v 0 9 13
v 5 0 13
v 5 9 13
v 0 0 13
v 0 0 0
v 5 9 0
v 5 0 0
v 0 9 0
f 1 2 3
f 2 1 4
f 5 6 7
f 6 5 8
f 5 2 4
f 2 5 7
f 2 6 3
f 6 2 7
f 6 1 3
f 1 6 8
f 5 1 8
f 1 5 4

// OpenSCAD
// Generated by SolidPython 1.0.1 on 2020-07-29 00:46:54


cube(size = [5, 9, 13]);
/***********************************************
*********      SolidPython code:      **********
************************************************
 
# import packages: SolidPython
from solid import *
from solid.utils import *
from itertools import chain, combinations, permutations


class Resize:

    def __init__(self, scad_file):
        self.scad_file = scad_file
        #self.scad_file = import_scad(scad_file)
        # cone/cylinder param:
        self.r1 = 0
        self.r2 = 0
        self.h = 0
        # rectangular prism param:
        self.w = 0
        self.l = 0
        # ellipse param:
        self.r = 0

    # import OpenScad code (file name corresponds to shape)


    # classify shape + parameters
    def assign(self, param1, param2, param3):
        if self.scad_file == 'cone.scad':
            self.r1 = param1
            self.r2 = param2
            self.h = param3
        elif self.scad_file == 'cylinder.scad':
            self.r1 = param1
            self.r2 = param2
            self.h = param3
        elif self.scad_file == 'rectangularPrism.scad':
            self.h = param1
            self.l = param2
            self.w = param3
        else:
            self.r = param1
            self.h = param2

    # resize parameters
    def iterate(self):
        x = range(3, 20, 2)
        i = 1
        if self.scad_file == 'cone.scad':
            tempList = list(permutations(x, 2))
            for temp in tempList:
                param1 = temp[0]
                param2 = temp[1]
                filepath = 'produced_scad_files/' + 'cone' + str(param1) + '_' + str(param2) + '_' + '.scad'
                scad_render_to_file(cylinder(h=param1, r1=param2, r2=0), filepath)

        elif self.scad_file == 'cylinder.scad':
            tempList = list(permutations(x, 3))
            for temp in tempList:
                param1 = temp[0]
                param2 = temp[1]
                filepath = 'produced_scad_files/' + 'cylinder' + str(param1) + '_' + str(param2) + '_' + '.scad'
                scad_render_to_file(cylinder(h=param1, r1=param2, r2=param2), filepath)

        elif self.scad_file == 'rectangularPrism.scad':
            tempList = list(permutations(x, 3))
            for temp in tempList:
                param1 = temp[0]
                param2 = temp[1]
                param3 = temp[2]
                filepath = 'produced_scad_files/' + 'rectangularPrism' + str(param1) + '_' + str(param2) + '_' + str(
                    param3) + '.scad'
                scad_render_to_file(cube(size=(param1, param2, param3)), filepath)

        elif self.scad_file == 'ellipse.scad':
            tempList = list(permutations(x, 4))
            for temp in tempList:
                param1 = temp[0]
                param2 = temp[1]
                param3 = temp[2]
                param4 = temp[3]
                filepath = 'produced_scad_files/' + 'ellipse' + str(param1) + '_' + str(param2) + '_' + str(param3) + '_' + str(param4) + '.scad'
                scad_render_to_file(scale([param1, param2, param3])(sphere(r=param4)), filepath)

    def render_to_scadfile(self):
        scad_render_to_file(scad, 'example.scad') 
 
************************************************/
